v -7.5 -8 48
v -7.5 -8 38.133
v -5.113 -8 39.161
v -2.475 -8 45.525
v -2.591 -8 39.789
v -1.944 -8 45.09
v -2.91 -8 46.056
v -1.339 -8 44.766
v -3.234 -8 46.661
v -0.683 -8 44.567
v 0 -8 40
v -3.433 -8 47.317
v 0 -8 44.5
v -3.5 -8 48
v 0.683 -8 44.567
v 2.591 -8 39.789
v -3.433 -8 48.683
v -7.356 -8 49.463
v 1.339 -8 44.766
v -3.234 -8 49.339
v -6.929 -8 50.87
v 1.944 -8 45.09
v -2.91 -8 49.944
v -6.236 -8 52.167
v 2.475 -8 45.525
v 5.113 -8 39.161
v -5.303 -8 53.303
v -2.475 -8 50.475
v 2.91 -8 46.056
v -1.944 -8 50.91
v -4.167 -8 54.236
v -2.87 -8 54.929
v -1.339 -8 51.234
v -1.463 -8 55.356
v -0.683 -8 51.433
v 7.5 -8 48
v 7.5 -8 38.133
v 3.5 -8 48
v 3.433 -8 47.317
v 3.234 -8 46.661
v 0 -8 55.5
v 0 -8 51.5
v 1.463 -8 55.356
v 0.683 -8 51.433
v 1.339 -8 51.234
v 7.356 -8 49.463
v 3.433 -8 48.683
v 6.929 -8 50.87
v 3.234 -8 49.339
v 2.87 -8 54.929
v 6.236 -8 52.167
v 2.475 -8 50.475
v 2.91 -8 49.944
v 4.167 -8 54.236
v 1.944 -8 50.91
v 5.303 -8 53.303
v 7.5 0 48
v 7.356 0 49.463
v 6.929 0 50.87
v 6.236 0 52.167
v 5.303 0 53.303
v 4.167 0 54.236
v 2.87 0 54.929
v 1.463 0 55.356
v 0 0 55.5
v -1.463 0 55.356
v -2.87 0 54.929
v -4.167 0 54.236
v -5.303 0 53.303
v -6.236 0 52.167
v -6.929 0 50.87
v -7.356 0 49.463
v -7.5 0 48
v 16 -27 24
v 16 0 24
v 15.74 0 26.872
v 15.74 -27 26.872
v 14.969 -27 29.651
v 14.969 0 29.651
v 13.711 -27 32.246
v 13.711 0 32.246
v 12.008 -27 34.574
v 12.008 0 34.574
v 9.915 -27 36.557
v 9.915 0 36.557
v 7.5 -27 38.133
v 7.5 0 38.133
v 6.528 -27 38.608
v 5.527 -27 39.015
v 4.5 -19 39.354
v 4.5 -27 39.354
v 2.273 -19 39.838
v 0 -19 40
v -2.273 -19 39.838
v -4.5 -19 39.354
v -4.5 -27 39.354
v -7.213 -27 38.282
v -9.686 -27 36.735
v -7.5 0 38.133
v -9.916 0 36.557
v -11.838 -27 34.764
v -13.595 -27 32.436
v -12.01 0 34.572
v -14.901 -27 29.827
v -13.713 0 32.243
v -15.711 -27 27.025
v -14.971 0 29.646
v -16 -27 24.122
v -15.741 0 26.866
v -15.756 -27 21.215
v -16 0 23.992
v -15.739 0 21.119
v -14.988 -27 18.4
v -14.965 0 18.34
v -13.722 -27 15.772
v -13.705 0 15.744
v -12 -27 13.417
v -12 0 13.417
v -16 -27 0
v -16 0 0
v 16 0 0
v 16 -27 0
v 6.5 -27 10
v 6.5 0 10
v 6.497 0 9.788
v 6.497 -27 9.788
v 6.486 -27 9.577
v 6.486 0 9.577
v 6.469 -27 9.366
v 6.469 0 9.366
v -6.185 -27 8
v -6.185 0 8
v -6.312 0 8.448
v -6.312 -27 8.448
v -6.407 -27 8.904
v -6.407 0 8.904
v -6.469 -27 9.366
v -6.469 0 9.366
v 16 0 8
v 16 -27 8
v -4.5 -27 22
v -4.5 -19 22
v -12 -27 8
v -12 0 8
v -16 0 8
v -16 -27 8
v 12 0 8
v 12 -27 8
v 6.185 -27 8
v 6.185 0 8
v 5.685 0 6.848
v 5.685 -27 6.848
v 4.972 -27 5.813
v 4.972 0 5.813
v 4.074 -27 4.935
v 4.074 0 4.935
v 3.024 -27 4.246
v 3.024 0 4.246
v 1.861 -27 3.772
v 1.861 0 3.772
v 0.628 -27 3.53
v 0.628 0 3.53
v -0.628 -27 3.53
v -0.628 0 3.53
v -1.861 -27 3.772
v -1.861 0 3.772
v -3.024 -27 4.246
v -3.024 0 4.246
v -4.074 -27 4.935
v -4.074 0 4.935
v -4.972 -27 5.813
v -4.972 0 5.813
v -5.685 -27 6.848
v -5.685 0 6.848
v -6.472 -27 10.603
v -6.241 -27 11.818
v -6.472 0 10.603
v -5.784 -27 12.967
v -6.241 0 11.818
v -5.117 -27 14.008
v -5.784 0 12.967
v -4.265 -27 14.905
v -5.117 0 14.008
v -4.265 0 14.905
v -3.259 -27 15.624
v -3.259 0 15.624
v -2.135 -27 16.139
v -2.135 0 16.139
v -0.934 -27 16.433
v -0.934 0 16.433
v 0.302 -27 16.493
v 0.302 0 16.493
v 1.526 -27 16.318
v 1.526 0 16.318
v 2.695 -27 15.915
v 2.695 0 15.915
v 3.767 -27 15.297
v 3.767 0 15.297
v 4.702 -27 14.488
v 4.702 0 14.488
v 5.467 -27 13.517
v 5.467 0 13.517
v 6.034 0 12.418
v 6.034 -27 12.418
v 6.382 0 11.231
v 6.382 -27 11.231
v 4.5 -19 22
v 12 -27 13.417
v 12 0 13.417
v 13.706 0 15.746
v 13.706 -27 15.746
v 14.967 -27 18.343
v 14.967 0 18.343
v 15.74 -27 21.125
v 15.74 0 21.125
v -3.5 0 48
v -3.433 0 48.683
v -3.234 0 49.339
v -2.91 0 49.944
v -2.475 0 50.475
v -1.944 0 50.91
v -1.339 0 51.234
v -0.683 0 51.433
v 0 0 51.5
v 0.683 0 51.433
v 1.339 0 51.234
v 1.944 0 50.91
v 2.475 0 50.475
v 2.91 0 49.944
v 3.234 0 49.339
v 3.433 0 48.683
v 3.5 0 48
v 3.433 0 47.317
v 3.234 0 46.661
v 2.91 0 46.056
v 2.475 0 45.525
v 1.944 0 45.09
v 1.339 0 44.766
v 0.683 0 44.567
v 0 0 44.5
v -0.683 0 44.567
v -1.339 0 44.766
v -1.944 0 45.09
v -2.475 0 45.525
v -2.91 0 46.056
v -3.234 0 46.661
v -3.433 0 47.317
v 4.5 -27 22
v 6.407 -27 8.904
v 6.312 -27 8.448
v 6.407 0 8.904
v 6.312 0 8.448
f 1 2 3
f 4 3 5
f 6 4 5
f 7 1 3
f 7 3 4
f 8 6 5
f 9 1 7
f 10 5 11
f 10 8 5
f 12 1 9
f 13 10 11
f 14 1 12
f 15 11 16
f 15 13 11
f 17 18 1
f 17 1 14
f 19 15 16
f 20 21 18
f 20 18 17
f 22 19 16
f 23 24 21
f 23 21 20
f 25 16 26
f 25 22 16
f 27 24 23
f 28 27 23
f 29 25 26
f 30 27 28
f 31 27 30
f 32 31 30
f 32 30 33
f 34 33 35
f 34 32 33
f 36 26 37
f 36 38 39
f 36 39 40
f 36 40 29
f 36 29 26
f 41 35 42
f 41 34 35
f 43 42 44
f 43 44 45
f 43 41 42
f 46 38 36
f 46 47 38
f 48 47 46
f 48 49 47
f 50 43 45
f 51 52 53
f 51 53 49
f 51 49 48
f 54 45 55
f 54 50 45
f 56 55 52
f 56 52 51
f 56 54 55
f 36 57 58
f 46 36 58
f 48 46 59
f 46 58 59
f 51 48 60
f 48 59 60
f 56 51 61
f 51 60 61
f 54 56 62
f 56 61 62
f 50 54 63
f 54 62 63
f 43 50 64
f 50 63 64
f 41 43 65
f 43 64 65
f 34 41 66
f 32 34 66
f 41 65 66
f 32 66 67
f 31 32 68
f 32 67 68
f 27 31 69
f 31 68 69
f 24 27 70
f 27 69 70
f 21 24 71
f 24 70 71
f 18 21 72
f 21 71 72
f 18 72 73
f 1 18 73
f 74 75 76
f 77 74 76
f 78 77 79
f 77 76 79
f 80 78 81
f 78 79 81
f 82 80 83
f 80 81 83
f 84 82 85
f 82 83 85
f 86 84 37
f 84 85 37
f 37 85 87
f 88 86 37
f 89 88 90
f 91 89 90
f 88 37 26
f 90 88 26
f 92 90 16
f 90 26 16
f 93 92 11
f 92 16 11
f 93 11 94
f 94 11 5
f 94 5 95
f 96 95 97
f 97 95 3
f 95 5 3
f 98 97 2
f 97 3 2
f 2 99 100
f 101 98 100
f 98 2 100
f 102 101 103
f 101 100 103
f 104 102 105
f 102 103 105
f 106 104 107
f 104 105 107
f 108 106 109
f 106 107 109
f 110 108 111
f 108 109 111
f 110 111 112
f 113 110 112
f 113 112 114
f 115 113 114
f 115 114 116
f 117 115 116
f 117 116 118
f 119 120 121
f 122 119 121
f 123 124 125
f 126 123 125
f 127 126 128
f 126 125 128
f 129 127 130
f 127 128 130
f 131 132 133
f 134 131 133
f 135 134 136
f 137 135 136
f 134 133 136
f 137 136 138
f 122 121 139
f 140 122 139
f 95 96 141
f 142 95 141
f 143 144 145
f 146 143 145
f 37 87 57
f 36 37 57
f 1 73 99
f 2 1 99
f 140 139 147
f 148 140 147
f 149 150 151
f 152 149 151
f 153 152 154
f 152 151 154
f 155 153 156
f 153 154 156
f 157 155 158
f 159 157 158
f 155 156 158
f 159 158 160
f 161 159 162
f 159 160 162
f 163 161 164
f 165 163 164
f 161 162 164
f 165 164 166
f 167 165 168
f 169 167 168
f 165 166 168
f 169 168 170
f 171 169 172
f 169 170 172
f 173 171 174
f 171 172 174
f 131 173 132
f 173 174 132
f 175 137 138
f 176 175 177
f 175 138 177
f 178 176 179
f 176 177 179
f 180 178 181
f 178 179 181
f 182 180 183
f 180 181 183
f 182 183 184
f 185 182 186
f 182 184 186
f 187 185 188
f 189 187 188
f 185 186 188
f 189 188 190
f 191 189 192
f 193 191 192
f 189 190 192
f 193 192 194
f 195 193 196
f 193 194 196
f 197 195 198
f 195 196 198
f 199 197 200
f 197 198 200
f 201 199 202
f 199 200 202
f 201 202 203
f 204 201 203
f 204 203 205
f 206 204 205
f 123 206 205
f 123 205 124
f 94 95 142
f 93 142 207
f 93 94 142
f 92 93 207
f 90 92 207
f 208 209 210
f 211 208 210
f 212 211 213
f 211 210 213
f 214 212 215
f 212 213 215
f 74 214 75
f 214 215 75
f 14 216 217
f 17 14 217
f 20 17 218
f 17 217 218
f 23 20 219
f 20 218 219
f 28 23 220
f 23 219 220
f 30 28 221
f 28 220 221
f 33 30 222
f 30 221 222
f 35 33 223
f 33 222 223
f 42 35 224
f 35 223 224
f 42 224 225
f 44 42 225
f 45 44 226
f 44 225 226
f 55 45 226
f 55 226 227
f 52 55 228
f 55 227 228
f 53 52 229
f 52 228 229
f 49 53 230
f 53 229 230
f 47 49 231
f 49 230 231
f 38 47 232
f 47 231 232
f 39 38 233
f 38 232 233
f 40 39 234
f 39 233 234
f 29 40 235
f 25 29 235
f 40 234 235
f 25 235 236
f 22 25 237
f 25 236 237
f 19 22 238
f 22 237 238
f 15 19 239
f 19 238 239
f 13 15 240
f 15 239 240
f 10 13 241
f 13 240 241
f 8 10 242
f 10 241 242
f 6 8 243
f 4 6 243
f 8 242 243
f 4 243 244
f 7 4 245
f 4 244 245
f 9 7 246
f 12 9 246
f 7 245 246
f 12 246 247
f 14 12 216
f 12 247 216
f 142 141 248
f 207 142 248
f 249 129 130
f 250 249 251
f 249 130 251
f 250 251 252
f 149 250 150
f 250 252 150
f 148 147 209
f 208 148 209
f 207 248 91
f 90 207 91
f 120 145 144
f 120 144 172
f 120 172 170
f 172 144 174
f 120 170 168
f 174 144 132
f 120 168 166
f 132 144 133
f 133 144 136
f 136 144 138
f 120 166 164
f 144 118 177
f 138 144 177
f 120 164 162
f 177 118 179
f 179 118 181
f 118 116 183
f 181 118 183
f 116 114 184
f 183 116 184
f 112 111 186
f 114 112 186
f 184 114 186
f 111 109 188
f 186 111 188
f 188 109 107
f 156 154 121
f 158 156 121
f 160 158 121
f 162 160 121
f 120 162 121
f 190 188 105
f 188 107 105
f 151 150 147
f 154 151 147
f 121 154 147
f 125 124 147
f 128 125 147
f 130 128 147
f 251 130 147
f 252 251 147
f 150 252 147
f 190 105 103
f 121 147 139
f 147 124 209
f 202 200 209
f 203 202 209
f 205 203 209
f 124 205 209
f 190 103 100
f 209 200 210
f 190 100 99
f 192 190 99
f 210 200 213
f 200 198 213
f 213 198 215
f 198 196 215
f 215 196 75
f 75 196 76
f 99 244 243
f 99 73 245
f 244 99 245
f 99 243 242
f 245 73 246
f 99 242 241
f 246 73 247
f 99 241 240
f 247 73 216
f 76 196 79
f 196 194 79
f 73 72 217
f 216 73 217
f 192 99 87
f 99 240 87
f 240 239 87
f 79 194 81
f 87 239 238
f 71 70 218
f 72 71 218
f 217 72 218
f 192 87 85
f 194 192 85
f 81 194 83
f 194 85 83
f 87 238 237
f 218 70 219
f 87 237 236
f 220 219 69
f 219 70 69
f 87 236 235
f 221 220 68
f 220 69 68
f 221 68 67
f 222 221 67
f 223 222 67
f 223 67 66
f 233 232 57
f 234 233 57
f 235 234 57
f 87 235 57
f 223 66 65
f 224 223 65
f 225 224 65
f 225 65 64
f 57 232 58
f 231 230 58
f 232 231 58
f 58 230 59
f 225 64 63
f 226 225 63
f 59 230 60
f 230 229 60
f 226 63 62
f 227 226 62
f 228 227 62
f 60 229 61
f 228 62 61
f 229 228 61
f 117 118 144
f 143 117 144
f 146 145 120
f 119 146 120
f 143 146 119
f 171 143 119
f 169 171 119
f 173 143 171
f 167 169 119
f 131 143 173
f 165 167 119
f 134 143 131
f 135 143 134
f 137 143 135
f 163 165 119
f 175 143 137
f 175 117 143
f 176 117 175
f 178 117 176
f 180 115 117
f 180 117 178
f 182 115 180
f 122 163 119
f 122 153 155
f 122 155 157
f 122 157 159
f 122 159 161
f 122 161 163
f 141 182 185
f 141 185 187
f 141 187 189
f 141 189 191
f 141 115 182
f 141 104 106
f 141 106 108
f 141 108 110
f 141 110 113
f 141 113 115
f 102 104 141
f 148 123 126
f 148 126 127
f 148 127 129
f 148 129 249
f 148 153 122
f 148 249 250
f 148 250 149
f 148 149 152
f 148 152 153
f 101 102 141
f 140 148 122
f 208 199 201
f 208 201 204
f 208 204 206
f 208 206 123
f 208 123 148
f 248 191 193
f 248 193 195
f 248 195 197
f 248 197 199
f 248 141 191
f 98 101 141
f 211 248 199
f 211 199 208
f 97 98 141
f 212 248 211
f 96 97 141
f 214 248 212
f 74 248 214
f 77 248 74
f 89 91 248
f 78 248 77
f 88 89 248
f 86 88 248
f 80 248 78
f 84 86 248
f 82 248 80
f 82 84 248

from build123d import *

# Parameters (mm, degrees)
F1_DEPTH = 27
F2_DEPTH = 8
F4_DEPTH = 8


with BuildPart() as f1:
    # F0 (on Front) → F1 (new body)
    with BuildSketch(Plane.XZ):
        with BuildLine():
            ThreePointArc((-7.5, 38.1332940251), (-15.7412312858, 26.8659444529), (-12, 13.4169947557))
            Line((-12, 13.4169947557), (-12, 22))
            Line((-12, 22), (12, 22))
            Line((12, 22), (12, 13.4169947557))
            ThreePointArc((12, 13.4169947557), (14.9666295471, 18.3431457505), (16, 24))
            ThreePointArc((16, 24), (13.7113092008, 32.2462112512), (7.5, 38.1332940251))
            Line((7.5, 38.1332940251), (-7.5, 38.1332940251))
        make_face()
        with BuildLine():
            Line((-12, 22), (-12, 13.4169947557))
            ThreePointArc((-12, 13.4169947557), (-9.454026078, 11.091809154), (-6.4690134152, 9.3660714286))
            ThreePointArc((-6.4690134152, 9.3660714286), (-0.3173427178, 16.4922487321), (6.5, 10))
            ThreePointArc((6.5, 10), (6.4922487321, 9.6826572822), (6.4690134152, 9.3660714286))
            ThreePointArc((6.4690134152, 9.3660714286), (9.454026078, 11.091809154), (12, 13.4169947557))
            Line((12, 13.4169947557), (12, 22))
            Line((12, 22), (-12, 22))
        make_face()
        with BuildLine():
            ThreePointArc((7.5, 38.1332940251), (0, 40), (-7.5, 38.1332940251))
            Line((-7.5, 38.1332940251), (7.5, 38.1332940251))
        make_face()
        with BuildLine():
            Line((-12, 8), (-16, 8))
            Line((-16, 8), (-16, 0))
            Line((-16, 0), (16, 0))
            Line((16, 0), (16, 8))
            Line((16, 8), (12, 8))
            Line((12, 8), (6.1846584384, 8))
            ThreePointArc((6.1846584384, 8), (0, 3.5), (-6.1846584384, 8))
            Line((-6.1846584384, 8), (-12, 8))
        make_face()
        with BuildLine():
            ThreePointArc((6.4690134152, 9.3660714286), (6.3635988742, 8.6753833128), (6.1846584384, 8))
            Line((6.1846584384, 8), (12, 8))
            Line((12, 8), (12, 13.4169947557))
            ThreePointArc((12, 13.4169947557), (9.454026078, 11.091809154), (6.4690134152, 9.3660714286))
        make_face()
        with BuildLine():
            Line((-12, 13.4169947557), (-12, 8))
            Line((-12, 8), (-6.1846584384, 8))
            ThreePointArc((-6.1846584384, 8), (-6.3635988742, 8.6753833128), (-6.4690134152, 9.3660714286))
            ThreePointArc((-6.4690134152, 9.3660714286), (-9.454026078, 11.091809154), (-12, 13.4169947557))
        make_face()
    extrude(amount=F1_DEPTH)

    # F0 (on Front) → F2 (join)
    with BuildSketch(Plane.XZ):
        with BuildLine():
            Line((-3.5, 48), (-7.5, 48))
            ThreePointArc((-7.5, 48), (0, 40.5), (7.5, 48))
            Line((7.5, 48), (3.5, 48))
            ThreePointArc((3.5, 48), (0, 44.5), (-3.5, 48))
        make_face()
        with BuildLine():
            ThreePointArc((7.5, 48), (0, 55.5), (-7.5, 48))
            Line((-7.5, 48), (-3.5, 48))
            ThreePointArc((-3.5, 48), (0, 51.5), (3.5, 48))
            Line((3.5, 48), (7.5, 48))
        make_face()
        with BuildLine():
            Line((-7.5, 48), (-7.5, 38.1332940251))
            ThreePointArc((-7.5, 38.1332940251), (0, 40), (7.5, 38.1332940251))
            Line((7.5, 38.1332940251), (7.5, 48))
            ThreePointArc((7.5, 48), (0, 40.5), (-7.5, 48))
        make_face()
    extrude(amount=F2_DEPTH)

    # F3 (on face) → F4 (cut)
    with BuildSketch(Plane.XZ.offset(27)):
        with BuildLine():
            Line((-4.5, 39.3541525328), (-4.5, 22))
            Line((-4.5, 22), (4.5, 22))
            Line((4.5, 22), (4.5, 39.3541525328))
            ThreePointArc((4.5, 39.3541525328), (0, 40), (-4.5, 39.3541525328))
        make_face()
    extrude(amount=-F4_DEPTH, mode=Mode.SUBTRACT)


solid = f1.part
